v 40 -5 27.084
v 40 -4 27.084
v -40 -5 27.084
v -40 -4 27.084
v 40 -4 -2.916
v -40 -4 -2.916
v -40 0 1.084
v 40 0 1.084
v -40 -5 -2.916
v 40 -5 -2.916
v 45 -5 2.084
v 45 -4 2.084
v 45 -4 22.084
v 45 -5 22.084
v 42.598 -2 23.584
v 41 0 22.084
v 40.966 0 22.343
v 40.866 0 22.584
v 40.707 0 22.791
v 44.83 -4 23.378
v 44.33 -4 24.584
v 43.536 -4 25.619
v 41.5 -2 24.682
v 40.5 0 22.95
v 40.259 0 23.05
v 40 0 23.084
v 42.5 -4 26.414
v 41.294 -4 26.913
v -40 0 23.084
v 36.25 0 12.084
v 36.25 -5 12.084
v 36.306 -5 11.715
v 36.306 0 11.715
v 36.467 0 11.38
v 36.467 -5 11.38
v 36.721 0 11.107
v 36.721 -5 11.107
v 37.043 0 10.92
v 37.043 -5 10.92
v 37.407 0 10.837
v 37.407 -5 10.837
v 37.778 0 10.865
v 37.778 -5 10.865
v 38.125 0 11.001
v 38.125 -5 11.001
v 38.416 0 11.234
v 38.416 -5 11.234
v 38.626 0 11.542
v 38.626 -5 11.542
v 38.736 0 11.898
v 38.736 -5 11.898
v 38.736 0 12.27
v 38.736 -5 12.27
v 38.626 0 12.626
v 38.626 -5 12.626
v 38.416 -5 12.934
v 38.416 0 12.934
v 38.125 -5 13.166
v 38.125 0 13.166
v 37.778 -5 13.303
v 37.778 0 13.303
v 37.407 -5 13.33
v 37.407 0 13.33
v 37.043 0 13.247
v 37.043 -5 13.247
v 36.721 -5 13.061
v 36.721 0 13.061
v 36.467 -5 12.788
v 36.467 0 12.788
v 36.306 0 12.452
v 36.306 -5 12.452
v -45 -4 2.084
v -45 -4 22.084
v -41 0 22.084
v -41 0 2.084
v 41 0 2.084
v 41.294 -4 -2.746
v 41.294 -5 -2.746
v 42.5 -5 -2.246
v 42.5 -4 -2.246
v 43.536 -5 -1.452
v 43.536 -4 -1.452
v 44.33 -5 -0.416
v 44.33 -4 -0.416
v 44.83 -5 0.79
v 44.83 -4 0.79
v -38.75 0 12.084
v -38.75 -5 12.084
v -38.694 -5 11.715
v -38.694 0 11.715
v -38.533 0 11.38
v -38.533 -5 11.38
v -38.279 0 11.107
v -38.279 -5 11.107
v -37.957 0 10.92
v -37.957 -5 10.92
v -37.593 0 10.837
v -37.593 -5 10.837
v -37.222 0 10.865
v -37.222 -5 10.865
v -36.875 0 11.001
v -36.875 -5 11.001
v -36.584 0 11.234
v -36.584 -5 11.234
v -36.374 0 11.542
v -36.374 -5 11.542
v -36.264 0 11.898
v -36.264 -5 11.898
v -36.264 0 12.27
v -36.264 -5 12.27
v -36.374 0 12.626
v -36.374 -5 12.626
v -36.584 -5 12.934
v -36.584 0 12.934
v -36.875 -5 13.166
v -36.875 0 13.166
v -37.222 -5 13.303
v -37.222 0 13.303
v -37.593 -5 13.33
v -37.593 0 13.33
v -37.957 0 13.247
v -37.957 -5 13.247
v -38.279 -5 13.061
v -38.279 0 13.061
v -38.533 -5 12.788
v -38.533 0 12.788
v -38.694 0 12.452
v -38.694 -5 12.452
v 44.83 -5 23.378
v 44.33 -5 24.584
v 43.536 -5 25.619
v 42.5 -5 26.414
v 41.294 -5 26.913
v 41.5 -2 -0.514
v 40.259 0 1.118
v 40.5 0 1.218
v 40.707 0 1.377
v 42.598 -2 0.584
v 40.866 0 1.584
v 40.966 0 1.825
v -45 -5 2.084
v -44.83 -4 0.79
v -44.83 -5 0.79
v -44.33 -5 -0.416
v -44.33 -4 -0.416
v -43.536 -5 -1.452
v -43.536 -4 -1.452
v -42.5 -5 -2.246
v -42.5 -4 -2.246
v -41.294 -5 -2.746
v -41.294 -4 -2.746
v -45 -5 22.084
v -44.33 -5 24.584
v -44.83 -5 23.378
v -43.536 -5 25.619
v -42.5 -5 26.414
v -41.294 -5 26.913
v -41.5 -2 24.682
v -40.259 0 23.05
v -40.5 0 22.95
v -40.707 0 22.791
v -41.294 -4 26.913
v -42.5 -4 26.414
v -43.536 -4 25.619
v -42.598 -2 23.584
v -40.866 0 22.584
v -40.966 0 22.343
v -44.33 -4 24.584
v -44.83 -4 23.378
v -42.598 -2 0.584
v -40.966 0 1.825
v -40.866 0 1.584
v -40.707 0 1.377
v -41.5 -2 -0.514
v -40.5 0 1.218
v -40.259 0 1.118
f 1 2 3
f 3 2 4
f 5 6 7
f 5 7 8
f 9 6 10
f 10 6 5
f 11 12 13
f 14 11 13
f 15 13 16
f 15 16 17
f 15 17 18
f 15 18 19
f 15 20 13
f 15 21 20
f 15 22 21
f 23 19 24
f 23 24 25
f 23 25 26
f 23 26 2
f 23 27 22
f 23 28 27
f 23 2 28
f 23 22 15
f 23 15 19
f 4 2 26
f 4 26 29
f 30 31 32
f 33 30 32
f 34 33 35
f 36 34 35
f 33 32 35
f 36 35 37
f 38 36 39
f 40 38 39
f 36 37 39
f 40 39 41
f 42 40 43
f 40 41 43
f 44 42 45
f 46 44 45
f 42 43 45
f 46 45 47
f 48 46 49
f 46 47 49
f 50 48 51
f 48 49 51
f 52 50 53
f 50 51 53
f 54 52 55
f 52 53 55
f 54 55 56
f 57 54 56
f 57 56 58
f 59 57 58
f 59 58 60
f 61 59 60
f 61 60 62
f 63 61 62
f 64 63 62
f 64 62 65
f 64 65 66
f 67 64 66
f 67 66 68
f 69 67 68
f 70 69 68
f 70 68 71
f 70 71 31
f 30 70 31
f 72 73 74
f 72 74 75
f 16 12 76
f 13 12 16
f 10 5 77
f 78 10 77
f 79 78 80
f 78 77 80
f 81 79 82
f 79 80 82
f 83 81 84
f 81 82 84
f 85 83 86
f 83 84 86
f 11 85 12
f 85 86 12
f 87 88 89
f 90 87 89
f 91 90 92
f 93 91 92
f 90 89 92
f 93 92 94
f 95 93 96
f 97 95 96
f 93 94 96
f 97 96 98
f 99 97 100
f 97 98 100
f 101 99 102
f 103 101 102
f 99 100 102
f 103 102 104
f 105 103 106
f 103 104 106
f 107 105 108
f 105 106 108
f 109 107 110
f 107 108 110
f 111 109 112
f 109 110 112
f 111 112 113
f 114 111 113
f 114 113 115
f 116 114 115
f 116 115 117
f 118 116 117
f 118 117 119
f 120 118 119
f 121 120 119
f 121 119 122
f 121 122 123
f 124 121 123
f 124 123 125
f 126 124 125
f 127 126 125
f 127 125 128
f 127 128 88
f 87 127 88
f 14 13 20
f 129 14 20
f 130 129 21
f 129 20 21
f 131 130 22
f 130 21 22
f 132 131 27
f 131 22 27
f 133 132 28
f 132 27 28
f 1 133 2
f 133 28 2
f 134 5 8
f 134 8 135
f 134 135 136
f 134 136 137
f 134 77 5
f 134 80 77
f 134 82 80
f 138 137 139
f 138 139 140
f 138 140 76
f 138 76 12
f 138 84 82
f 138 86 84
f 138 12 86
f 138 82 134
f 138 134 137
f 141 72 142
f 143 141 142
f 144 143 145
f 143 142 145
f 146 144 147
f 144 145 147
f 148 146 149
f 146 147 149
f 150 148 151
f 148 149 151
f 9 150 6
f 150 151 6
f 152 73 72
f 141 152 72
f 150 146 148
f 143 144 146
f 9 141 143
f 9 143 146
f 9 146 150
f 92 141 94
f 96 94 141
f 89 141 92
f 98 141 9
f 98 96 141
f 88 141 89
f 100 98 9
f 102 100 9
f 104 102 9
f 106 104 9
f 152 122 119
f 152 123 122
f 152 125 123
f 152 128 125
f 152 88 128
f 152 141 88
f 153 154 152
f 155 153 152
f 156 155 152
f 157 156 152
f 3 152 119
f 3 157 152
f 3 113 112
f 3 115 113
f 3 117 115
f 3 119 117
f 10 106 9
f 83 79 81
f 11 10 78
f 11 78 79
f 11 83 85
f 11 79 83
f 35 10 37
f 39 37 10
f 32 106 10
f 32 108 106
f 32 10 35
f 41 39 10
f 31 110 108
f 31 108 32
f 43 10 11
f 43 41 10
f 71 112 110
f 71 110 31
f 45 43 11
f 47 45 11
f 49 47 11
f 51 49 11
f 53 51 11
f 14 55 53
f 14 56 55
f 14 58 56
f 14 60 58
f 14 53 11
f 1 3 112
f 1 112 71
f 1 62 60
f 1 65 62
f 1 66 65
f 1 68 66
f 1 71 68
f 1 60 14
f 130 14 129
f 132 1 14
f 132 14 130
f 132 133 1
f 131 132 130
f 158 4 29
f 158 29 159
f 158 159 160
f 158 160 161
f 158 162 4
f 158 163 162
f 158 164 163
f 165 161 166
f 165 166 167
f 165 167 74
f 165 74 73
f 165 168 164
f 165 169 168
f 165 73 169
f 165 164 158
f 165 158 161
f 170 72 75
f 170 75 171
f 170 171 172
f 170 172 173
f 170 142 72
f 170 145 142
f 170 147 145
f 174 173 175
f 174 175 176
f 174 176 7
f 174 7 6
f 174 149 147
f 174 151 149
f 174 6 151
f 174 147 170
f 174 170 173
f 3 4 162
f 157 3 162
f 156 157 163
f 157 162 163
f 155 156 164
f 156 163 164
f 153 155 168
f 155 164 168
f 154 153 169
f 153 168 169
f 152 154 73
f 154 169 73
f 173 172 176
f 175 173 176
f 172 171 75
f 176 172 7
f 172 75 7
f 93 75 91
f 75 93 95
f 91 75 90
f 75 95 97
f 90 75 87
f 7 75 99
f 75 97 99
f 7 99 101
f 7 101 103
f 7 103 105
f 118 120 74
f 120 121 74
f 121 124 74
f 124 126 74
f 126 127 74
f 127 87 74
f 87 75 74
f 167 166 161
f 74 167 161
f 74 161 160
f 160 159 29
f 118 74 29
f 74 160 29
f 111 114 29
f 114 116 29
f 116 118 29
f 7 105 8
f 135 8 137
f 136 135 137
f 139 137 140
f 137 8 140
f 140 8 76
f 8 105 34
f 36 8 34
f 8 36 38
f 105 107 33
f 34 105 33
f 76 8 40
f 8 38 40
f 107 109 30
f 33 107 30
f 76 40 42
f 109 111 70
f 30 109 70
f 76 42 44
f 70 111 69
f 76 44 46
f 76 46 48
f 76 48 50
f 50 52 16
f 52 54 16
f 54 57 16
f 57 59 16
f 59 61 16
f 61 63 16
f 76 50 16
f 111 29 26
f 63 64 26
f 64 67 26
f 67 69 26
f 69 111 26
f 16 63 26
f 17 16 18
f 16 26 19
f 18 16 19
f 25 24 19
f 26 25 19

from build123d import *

# Parameters (mm, degrees)
F1_DEPTH = 5
F2_D     = 2.5
F2_DEPTH = 15
F2_TIP   = 0.7510757738
F3_SIZE  = 4


with BuildPart() as f1:
    # F0 (on Front) → F1 (new body)
    with BuildSketch(Plane.XZ):
        with BuildLine():
            Line((39.9999981374, 27.0838558645), (-40.0000018626, 27.0838558645))
            ThreePointArc((-40.0000018626, 27.0838558645), (-43.5355357686, 25.6193897704), (-45.0000018626, 22.0838558645))
            Line((-45.0000018626, 22.0838558645), (-45.0000018626, 12.0838558645))
            Line((-45.0000018626, 12.0838558645), (-37.5000018626, 12.0838558645))
            Line((-37.5000018626, 12.0838558645), (37.4999981374, 12.0838558645))
            Line((37.4999981374, 12.0838558645), (44.9999981374, 12.0838558645))
            Line((44.9999981374, 12.0838558645), (44.9999981374, 22.0838558645))
            ThreePointArc((44.9999981374, 22.0838558645), (43.5355320433, 25.6193897704), (39.9999981374, 27.0838558645))
        make_face()
        with BuildLine():
            Line((-37.5000018626, 12.0838558645), (-45.0000018626, 12.0838558645))
            Line((-45.0000018626, 12.0838558645), (-45.0000018626, 2.0838558645))
            ThreePointArc((-45.0000018626, 2.0838558645), (-43.5355357686, -1.4516780414), (-40.0000018626, -2.9161441355))
            Line((-40.0000018626, -2.9161441355), (39.9999981374, -2.9161441355))
            ThreePointArc((39.9999981374, -2.9161441355), (43.5355320433, -1.4516780414), (44.9999981374, 2.0838558645))
            Line((44.9999981374, 2.0838558645), (44.9999981374, 12.0838558645))
            Line((44.9999981374, 12.0838558645), (37.4999981374, 12.0838558645))
            Line((37.4999981374, 12.0838558645), (-37.5000018626, 12.0838558645))
        make_face()
    extrude(amount=F1_DEPTH)

    # F2
    with Locations(Plane(origin=(0, 0, 0), x_dir=(1, 0, 0), z_dir=(0, 1, 0))):
        with Locations((-37.5000018626, -12.0838558645), (37.4999981374, -12.0838558645)):
            Hole(F2_D / 2, depth=F2_DEPTH)
            with Locations((0, 0, -(F2_DEPTH + F2_TIP / 2))):  # 118° drill point
                Cone(0, F2_D / 2, F2_TIP, mode=Mode.SUBTRACT)

    # F3
    f3_edges = [f1.edges().sort_by_distance(p)[0] for p in [
        (-2e-06, 0, -2.916144),
    ]]
    chamfer(f3_edges, length=F3_SIZE)


solid = f1.part
